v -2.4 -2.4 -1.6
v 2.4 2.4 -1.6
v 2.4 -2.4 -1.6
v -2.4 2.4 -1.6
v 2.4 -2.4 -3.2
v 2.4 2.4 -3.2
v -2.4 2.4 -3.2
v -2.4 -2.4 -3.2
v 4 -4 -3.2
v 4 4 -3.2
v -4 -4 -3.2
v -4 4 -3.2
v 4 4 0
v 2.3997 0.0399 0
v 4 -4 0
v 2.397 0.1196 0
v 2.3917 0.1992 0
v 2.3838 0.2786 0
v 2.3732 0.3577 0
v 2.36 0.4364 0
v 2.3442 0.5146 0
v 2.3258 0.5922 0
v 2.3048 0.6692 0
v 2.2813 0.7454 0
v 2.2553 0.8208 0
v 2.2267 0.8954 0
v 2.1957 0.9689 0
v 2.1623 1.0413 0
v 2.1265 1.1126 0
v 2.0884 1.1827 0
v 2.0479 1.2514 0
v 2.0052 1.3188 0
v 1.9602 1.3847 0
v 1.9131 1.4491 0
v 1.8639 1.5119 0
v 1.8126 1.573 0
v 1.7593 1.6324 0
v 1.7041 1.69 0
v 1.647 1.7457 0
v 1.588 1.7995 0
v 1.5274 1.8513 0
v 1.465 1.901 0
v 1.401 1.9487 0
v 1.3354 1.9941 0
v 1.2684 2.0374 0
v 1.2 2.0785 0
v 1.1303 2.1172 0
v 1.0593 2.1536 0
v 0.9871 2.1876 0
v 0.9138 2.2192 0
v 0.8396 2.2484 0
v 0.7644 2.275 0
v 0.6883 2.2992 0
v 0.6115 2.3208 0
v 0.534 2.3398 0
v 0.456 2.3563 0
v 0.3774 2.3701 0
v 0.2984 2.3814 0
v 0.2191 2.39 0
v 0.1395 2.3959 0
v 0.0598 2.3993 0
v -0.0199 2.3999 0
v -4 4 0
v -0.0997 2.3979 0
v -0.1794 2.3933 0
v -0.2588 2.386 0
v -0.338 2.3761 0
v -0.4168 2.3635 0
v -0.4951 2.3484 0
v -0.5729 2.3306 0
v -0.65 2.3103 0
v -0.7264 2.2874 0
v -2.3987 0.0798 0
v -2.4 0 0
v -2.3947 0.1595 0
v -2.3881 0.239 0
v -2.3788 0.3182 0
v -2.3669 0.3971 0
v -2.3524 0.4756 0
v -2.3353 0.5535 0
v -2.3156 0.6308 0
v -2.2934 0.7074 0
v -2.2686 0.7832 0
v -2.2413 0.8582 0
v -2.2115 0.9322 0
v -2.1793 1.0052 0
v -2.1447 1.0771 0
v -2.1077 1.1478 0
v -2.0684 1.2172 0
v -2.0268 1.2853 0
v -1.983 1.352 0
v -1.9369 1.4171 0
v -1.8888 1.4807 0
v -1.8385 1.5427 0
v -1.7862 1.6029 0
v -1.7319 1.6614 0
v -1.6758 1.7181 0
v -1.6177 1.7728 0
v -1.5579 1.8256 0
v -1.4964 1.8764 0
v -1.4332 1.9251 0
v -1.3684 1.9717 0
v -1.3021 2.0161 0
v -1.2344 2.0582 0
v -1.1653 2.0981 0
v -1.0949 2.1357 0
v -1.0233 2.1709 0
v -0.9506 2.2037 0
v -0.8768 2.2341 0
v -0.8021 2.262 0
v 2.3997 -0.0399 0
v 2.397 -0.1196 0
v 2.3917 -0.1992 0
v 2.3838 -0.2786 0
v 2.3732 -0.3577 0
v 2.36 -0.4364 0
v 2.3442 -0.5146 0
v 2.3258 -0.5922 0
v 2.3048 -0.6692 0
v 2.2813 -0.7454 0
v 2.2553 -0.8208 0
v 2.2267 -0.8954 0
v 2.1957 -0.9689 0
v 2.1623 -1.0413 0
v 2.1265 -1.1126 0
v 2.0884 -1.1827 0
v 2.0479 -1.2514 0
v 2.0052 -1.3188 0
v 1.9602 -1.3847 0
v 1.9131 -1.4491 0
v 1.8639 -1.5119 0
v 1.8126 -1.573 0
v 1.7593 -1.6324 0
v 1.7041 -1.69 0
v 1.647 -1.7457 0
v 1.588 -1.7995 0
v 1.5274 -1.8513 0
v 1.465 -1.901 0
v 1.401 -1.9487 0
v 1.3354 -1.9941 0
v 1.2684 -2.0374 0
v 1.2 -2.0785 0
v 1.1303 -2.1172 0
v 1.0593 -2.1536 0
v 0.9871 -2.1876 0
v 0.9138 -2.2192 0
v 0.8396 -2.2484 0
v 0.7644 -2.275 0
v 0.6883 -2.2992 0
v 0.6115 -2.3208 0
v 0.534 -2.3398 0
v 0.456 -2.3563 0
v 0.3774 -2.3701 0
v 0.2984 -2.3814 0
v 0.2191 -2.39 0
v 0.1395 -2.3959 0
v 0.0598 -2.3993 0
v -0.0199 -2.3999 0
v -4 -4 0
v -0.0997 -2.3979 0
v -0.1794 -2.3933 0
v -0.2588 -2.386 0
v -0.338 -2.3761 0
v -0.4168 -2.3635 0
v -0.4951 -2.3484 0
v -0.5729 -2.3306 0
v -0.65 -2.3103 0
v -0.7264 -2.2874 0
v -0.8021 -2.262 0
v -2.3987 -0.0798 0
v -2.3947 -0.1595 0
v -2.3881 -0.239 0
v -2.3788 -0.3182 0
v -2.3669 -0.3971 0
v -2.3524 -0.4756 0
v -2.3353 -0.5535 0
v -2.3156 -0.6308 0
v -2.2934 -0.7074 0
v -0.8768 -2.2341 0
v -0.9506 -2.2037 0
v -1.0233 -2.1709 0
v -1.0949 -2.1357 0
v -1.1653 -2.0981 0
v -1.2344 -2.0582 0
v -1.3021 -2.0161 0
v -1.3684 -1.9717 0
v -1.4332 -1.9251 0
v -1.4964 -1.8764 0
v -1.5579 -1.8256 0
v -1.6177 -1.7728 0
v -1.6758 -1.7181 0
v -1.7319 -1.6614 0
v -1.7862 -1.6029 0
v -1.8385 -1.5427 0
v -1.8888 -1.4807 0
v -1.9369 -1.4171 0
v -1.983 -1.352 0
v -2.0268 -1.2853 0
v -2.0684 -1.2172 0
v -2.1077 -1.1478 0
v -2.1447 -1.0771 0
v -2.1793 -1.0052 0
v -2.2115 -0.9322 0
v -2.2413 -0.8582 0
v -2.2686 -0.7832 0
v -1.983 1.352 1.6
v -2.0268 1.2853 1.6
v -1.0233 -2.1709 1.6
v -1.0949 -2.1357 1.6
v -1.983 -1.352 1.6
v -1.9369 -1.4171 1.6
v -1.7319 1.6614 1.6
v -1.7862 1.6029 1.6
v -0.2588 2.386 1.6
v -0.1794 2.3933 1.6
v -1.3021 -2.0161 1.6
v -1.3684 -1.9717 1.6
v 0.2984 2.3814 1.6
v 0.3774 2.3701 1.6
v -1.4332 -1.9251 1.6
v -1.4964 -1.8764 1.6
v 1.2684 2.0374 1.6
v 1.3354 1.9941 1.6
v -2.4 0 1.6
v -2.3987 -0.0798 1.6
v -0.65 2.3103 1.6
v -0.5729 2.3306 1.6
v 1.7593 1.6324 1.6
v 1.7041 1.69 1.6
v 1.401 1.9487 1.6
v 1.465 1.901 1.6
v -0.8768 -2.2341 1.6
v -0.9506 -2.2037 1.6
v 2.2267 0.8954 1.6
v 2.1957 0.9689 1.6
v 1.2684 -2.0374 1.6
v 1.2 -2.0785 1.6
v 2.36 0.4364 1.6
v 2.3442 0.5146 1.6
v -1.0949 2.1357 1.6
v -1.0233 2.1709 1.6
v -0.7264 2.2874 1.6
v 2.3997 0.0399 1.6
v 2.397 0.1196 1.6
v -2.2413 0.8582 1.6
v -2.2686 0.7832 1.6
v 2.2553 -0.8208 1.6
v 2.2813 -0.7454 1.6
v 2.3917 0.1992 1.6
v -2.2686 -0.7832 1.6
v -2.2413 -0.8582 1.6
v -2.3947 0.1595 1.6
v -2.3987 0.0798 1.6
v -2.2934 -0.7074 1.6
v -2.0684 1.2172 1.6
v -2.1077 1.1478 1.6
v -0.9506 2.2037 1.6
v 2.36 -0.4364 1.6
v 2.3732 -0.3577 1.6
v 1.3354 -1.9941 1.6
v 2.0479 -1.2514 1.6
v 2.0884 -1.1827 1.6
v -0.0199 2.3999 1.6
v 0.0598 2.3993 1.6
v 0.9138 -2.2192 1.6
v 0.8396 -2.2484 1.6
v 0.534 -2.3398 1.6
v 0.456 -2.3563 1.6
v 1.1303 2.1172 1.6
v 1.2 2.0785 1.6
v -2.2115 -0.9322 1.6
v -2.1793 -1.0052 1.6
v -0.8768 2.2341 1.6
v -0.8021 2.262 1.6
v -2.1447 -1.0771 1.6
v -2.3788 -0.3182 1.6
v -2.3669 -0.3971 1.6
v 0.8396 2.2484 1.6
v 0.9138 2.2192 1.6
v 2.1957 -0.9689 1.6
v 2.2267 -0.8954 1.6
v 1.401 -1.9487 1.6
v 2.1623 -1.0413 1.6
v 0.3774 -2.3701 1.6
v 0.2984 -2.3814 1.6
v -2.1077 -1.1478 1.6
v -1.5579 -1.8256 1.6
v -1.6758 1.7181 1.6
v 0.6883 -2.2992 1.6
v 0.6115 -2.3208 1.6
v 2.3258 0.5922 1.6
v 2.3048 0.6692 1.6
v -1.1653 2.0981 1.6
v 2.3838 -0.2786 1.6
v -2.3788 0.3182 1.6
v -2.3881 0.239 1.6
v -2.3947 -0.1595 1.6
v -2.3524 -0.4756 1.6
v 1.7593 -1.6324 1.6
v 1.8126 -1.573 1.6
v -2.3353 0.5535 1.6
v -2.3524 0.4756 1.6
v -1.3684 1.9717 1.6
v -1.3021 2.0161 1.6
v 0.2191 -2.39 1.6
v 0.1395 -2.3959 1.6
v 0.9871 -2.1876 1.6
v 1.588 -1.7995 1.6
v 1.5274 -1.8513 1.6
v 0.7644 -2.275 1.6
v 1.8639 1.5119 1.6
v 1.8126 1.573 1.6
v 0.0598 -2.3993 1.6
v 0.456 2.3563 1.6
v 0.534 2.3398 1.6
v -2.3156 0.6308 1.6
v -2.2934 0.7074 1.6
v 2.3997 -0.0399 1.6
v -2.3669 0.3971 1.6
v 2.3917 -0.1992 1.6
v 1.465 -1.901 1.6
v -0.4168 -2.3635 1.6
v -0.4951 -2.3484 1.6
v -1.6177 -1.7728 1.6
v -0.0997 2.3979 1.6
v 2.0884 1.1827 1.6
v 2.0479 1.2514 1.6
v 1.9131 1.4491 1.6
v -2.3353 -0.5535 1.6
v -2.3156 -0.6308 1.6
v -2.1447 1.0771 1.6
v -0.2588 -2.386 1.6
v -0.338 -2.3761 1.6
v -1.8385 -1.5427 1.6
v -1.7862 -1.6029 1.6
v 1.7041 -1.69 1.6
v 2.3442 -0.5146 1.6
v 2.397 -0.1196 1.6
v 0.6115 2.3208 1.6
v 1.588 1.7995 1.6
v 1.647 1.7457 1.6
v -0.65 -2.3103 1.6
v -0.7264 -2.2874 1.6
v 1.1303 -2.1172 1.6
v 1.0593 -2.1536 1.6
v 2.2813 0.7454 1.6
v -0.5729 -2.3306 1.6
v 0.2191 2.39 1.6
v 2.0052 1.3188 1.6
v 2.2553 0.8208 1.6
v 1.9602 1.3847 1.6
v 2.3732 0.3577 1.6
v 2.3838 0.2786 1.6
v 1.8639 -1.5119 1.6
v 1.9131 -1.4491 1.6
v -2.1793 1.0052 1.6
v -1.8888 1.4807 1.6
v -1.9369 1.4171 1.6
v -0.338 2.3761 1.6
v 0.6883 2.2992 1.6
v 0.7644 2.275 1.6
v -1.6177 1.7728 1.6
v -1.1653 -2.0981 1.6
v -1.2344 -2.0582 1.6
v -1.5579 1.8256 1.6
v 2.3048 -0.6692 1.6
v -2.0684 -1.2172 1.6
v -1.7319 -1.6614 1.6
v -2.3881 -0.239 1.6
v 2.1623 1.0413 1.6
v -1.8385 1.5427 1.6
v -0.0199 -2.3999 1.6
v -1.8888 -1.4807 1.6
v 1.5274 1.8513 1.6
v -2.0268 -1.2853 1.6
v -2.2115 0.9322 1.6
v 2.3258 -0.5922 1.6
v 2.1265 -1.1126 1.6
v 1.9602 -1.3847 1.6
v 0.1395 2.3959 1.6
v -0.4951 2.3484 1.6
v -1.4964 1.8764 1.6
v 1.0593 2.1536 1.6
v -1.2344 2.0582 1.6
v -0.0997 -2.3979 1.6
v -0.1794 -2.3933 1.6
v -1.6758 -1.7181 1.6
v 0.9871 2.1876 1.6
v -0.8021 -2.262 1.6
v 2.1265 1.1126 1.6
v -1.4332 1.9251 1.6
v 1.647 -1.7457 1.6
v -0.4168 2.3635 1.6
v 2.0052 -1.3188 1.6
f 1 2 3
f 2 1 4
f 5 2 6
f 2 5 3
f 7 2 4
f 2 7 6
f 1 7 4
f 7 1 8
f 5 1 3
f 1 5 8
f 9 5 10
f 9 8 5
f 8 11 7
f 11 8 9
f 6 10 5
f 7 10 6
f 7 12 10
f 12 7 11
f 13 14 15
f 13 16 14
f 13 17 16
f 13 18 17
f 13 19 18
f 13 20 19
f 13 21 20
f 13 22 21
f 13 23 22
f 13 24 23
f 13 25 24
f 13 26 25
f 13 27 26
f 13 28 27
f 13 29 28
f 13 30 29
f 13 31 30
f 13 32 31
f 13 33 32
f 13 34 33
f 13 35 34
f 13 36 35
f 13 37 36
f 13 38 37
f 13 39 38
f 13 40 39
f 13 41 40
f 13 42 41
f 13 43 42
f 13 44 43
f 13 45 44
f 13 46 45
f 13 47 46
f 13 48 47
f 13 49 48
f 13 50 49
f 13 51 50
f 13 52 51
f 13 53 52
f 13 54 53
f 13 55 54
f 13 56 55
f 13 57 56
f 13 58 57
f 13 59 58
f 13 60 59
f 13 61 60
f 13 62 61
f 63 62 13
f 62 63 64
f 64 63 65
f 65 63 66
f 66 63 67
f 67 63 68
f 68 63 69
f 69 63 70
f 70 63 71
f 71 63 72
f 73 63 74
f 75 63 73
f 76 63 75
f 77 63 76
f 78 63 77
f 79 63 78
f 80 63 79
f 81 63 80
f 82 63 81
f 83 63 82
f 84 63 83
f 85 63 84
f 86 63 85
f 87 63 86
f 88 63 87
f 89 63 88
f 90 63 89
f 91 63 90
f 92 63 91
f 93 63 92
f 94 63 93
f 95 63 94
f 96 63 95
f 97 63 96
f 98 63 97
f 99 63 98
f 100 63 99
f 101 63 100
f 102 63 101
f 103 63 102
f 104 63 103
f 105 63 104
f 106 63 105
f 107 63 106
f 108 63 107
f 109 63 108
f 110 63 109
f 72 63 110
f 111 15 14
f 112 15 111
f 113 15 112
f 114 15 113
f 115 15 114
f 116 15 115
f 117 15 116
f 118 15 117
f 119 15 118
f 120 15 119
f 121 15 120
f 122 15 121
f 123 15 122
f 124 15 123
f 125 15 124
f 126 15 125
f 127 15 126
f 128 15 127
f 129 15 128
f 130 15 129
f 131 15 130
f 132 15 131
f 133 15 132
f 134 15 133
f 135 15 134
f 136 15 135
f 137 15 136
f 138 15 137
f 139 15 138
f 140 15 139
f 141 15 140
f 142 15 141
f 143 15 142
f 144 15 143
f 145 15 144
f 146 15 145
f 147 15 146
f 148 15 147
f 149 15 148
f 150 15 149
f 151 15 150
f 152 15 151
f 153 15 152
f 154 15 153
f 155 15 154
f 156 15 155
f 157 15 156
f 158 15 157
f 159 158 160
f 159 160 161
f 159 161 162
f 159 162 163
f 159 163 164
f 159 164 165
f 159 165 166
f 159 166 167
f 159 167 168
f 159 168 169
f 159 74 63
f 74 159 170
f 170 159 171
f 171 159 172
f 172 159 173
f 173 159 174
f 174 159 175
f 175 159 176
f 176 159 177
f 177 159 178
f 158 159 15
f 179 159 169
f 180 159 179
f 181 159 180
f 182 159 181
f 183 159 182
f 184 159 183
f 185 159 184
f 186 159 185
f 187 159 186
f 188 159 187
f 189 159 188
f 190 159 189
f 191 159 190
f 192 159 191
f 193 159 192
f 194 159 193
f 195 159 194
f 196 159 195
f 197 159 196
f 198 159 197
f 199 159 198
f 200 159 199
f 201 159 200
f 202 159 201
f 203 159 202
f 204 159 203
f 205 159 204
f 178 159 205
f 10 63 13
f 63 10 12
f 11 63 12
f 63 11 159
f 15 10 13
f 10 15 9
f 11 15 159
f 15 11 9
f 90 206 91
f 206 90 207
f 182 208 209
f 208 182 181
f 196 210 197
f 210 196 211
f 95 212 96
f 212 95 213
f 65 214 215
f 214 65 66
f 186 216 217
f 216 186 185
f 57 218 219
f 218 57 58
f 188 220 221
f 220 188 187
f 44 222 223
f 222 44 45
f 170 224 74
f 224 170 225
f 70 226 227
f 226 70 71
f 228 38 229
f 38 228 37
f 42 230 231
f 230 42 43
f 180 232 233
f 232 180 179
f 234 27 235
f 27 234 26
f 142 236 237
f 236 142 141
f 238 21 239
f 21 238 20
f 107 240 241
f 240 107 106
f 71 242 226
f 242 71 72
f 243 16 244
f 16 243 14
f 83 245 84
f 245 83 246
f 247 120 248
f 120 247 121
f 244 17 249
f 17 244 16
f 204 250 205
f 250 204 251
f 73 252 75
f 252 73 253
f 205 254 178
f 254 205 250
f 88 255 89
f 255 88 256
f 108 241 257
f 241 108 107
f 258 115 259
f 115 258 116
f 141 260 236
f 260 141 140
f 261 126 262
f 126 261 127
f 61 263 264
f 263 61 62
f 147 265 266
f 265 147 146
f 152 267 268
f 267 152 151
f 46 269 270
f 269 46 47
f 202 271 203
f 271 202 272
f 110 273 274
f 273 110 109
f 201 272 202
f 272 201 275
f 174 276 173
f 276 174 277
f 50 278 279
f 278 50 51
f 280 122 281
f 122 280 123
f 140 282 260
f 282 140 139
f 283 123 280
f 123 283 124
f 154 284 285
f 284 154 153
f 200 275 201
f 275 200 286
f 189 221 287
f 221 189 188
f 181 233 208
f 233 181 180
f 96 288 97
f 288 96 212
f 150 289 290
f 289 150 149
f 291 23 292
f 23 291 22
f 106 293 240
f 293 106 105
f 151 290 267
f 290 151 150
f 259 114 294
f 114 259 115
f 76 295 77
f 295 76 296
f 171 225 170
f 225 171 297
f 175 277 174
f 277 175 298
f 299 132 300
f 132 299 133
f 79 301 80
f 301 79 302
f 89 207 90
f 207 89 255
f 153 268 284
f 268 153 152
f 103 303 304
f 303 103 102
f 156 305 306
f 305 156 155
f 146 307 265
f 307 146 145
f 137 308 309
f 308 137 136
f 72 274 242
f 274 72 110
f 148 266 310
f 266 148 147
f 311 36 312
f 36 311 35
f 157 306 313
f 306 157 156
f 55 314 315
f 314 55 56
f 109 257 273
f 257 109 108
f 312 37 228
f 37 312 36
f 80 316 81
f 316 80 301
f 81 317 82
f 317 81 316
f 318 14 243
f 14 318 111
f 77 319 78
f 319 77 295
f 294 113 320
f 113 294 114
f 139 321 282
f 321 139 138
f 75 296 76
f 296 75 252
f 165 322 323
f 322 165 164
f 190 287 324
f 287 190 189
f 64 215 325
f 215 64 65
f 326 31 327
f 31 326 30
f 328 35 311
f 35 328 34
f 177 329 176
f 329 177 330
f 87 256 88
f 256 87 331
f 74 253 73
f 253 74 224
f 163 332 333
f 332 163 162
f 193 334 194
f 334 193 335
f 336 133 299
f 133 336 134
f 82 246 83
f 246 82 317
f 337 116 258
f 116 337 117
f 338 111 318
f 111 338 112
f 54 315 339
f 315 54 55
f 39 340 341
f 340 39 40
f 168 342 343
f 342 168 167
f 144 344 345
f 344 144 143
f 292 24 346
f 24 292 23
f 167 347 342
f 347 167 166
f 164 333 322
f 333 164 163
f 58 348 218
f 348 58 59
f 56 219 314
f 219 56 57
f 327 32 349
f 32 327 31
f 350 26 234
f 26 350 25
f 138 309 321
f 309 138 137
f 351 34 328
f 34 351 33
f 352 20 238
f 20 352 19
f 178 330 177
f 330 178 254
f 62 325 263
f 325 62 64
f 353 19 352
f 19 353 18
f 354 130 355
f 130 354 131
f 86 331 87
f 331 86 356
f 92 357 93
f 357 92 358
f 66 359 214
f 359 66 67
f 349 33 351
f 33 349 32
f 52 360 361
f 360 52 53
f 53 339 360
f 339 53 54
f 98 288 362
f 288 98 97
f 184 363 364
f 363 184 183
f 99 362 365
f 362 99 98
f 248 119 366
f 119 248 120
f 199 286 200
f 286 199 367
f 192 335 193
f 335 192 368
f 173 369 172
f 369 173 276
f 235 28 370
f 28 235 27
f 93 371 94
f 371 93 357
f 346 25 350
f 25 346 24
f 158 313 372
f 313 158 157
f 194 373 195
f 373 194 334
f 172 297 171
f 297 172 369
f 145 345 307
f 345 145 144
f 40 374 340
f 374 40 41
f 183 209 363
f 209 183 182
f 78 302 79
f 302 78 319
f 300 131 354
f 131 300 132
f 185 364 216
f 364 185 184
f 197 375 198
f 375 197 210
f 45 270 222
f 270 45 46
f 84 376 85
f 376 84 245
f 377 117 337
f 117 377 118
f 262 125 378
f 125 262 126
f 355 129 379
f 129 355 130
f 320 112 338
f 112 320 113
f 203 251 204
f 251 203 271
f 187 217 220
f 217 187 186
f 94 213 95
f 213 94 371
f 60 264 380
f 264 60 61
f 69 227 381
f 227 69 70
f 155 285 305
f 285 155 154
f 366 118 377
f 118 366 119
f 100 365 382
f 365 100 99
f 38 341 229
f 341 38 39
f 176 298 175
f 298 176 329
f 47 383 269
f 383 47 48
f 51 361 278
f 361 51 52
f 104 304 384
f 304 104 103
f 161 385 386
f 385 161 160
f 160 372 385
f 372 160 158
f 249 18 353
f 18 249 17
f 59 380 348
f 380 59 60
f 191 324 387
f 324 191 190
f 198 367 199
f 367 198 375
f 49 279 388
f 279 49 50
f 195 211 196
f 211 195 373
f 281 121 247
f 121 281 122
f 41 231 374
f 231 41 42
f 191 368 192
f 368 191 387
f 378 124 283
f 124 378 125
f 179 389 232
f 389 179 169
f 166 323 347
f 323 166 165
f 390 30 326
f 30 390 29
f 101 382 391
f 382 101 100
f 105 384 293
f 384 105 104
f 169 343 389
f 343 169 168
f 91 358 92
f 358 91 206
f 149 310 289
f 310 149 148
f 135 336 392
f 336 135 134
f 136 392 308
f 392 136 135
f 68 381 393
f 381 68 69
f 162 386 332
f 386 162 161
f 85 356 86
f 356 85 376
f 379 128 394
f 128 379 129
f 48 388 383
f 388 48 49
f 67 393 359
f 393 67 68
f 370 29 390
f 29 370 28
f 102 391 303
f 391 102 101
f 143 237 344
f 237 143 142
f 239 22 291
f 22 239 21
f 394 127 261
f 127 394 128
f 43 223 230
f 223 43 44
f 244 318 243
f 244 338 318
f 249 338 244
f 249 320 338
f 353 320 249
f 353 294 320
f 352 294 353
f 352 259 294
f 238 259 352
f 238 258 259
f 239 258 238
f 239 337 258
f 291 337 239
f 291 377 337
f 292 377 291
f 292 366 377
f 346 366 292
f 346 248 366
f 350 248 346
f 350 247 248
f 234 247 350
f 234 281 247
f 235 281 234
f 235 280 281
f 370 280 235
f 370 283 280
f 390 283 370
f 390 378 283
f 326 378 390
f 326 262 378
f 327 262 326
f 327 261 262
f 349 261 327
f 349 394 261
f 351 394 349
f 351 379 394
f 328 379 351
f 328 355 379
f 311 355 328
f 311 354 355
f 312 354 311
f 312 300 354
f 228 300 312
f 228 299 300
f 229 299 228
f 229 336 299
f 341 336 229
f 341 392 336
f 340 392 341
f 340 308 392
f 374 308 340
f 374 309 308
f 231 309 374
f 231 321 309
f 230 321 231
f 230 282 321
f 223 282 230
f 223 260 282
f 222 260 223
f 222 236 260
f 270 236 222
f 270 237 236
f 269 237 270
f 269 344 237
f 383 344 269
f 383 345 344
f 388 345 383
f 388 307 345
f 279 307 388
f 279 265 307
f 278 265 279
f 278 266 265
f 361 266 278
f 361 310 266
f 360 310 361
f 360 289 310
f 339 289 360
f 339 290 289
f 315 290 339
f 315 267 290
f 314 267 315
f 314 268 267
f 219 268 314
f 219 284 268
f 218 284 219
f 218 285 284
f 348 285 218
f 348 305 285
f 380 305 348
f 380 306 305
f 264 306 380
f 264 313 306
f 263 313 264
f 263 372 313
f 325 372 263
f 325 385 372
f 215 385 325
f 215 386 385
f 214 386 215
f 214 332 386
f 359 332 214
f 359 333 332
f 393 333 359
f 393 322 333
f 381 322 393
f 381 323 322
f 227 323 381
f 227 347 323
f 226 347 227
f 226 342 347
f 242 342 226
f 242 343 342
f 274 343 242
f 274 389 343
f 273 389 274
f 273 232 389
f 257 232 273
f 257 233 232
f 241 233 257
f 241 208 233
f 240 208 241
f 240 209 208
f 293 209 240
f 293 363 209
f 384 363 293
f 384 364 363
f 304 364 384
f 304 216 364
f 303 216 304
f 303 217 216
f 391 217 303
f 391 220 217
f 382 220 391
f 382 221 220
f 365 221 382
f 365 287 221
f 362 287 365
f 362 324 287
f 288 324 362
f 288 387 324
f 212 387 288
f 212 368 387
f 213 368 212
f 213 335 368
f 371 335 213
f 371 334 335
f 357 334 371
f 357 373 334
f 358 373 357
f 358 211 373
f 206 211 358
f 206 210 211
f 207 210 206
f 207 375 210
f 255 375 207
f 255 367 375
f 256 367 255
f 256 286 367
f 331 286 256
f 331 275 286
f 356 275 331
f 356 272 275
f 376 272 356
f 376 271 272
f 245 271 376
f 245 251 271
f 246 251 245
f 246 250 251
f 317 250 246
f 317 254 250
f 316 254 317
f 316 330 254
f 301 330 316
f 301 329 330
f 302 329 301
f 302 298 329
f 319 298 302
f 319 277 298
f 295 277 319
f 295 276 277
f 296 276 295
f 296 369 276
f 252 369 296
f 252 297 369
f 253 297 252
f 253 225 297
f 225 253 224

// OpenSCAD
// file: ../p/4-4edge.scad
use <../lib.scad>
$fa=1; $fs=0.2;
function ldraw_lib__4_4edge(realsolid=false) = [
// 0 Circle 1.0
// 0 Name: 4-4edge.dat
// 0 Author: James Jessiman
// 0 !LDRAW_ORG Primitive UPDATE 2017-01
// 0 !LICENSE Licensed under CC BY 2.0 and CC BY 4.0 : see CAreadme.txt
// 
// 0 BFC CERTIFY CCW
  [0,"BFC","CERTIFY"],
  [0,"BFC","CCW"],
// 
// 0 !HISTORY 1998-12-15 [PTadmin] Official Update 1998-10
// 0 !HISTORY 2005-12-28 [PTadmin] Official Update 2005-01
// 0 !HISTORY 2007-06-24 [PTadmin] Header formatted for Contributor Agreement
// 0 !HISTORY 2008-07-01 [PTadmin] Official Update 2008-01
// 0 !HISTORY 2017-01-15 [Steffen] BFCed
// 0 !HISTORY 2017-12-30 [PTadmin] Official Update 2017-01
// 
// 
// 2 24 1 0 0 0.9239 0 0.3827
  [2,24,1,0,0,0.9239,0,0.3827],
// 2 24 0.9239 0 0.3827 0.7071 0 0.7071
  [2,24,0.9239,0,0.3827,0.7071,0,0.7071],
// 2 24 0.7071 0 0.7071 0.3827 0 0.9239
  [2,24,0.7071,0,0.7071,0.3827,0,0.9239],
// 2 24 0.3827 0 0.9239 0 0 1
  [2,24,0.3827,0,0.9239,0,0,1],
// 2 24 0 0 1 -0.3827 0 0.9239
  [2,24,0,0,1,-0.3827,0,0.9239],
// 2 24 -0.3827 0 0.9239 -0.7071 0 0.7071
  [2,24,-0.3827,0,0.9239,-0.7071,0,0.7071],
// 2 24 -0.7071 0 0.7071 -0.9239 0 0.3827
  [2,24,-0.7071,0,0.7071,-0.9239,0,0.3827],
// 2 24 -0.9239 0 0.3827 -1 0 -0
  [2,24,-0.9239,0,0.3827,-1,0,-0],
// 2 24 -1 0 -0 -0.9239 0 -0.3827
  [2,24,-1,0,-0,-0.9239,0,-0.3827],
// 2 24 -0.9239 0 -0.3827 -0.7071 0 -0.7071
  [2,24,-0.9239,0,-0.3827,-0.7071,0,-0.7071],
// 2 24 -0.7071 0 -0.7071 -0.3827 0 -0.9239
  [2,24,-0.7071,0,-0.7071,-0.3827,0,-0.9239],
// 2 24 -0.3827 0 -0.9239 0 0 -1
  [2,24,-0.3827,0,-0.9239,0,0,-1],
// 2 24 0 0 -1 0.3827 0 -0.9239
  [2,24,0,0,-1,0.3827,0,-0.9239],
// 2 24 0.3827 0 -0.9239 0.7071 0 -0.7071
  [2,24,0.3827,0,-0.9239,0.7071,0,-0.7071],
// 2 24 0.7071 0 -0.7071 0.9239 0 -0.3827
  [2,24,0.7071,0,-0.7071,0.9239,0,-0.3827],
// 2 24 0.9239 0 -0.3827 1 0 0
  [2,24,0.9239,0,-0.3827,1,0,0],
];
module ldraw_lib__4_4edge(step=0, col=false, unit=2/5, alt=false, line=0.2, solid=!$preview)
    makepoly(ldraw_lib__4_4edge(solid), step=step, col=col, unit=unit, alt=alt, line=line, solid=solid);
ldraw_lib__4_4edge(line=0.2);
// file: ../p/4-4disc.scad
use <../lib.scad>
$fa=1; $fs=0.2;
function ldraw_lib__4_4disc(realsolid=false) = [
// 0 Disc 1.0
// 0 Name: 4-4disc.dat
// 0 Author: James Jessiman
// 0 !LDRAW_ORG Primitive UPDATE 2002-02
// 0 !LICENSE Licensed under CC BY 2.0 and CC BY 4.0 : see CAreadme.txt
// 
// 0 BFC CERTIFY CCW
  [0,"BFC","CERTIFY"],
  [0,"BFC","CCW"],
// 
// 0 !HISTORY 1998-12-15 [PTadmin] Official Update 1998-10
// 0 !HISTORY 2002-03-23 [sbliss] Added BFC statement
// 0 !HISTORY 2002-04-25 [PTadmin] Official Update 2002-02
// 0 !HISTORY 2007-06-24 [PTadmin] Header formatted for Contributor Agreement
// 0 !HISTORY 2008-07-01 [PTadmin] Official Update 2008-01
// 
// 
// 3 16 0 0 0 1 0 0 0.9239 0 0.3827
  [3,16,0,0,0,1,0,0,0.9239,0,0.3827],
// 3 16 0 0 0 0.9239 0 0.3827 0.7071 0 0.7071
  [3,16,0,0,0,0.9239,0,0.3827,0.7071,0,0.7071],
// 3 16 0 0 0 0.7071 0 0.7071 0.3827 0 0.9239
  [3,16,0,0,0,0.7071,0,0.7071,0.3827,0,0.9239],
// 3 16 0 0 0 0.3827 0 0.9239 0 0 1
  [3,16,0,0,0,0.3827,0,0.9239,0,0,1],
// 3 16 0 0 0 0 0 1 -0.3827 0 0.9239
  [3,16,0,0,0,0,0,1,-0.3827,0,0.9239],
// 3 16 0 0 0 -0.3827 0 0.9239 -0.7071 0 0.7071
  [3,16,0,0,0,-0.3827,0,0.9239,-0.7071,0,0.7071],
// 3 16 0 0 0 -0.7071 0 0.7071 -0.9239 0 0.3827
  [3,16,0,0,0,-0.7071,0,0.7071,-0.9239,0,0.3827],
// 3 16 0 0 0 -0.9239 0 0.3827 -1 0 -0
  [3,16,0,0,0,-0.9239,0,0.3827,-1,0,-0],
// 3 16 0 0 0 -1 0 -0 -0.9239 0 -0.3827
  [3,16,0,0,0,-1,0,-0,-0.9239,0,-0.3827],
// 3 16 0 0 0 -0.9239 0 -0.3827 -0.7071 0 -0.7071
  [3,16,0,0,0,-0.9239,0,-0.3827,-0.7071,0,-0.7071],
// 3 16 0 0 0 -0.7071 0 -0.7071 -0.3827 0 -0.9239
  [3,16,0,0,0,-0.7071,0,-0.7071,-0.3827,0,-0.9239],
// 3 16 0 0 0 -0.3827 0 -0.9239 0 0 -1
  [3,16,0,0,0,-0.3827,0,-0.9239,0,0,-1],
// 3 16 0 0 0 0 0 -1 0.3827 0 -0.9239
  [3,16,0,0,0,0,0,-1,0.3827,0,-0.9239],
// 3 16 0 0 0 0.3827 0 -0.9239 0.7071 0 -0.7071
  [3,16,0,0,0,0.3827,0,-0.9239,0.7071,0,-0.7071],
// 3 16 0 0 0 0.7071 0 -0.7071 0.9239 0 -0.3827
  [3,16,0,0,0,0.7071,0,-0.7071,0.9239,0,-0.3827],
// 3 16 0 0 0 0.9239 0 -0.3827 1 0 0
  [3,16,0,0,0,0.9239,0,-0.3827,1,0,0],
// 0
];
module ldraw_lib__4_4disc(step=0, col=false, unit=2/5, alt=false, line=0.2, solid=!$preview)
    makepoly(ldraw_lib__4_4disc(solid), step=step, col=col, unit=unit, alt=alt, line=line, solid=solid);
ldraw_lib__4_4disc(line=0.2);
// file: ../p/4-4cyli.scad
use <../lib.scad>
$fa=1; $fs=0.2;
function ldraw_lib__4_4cyli(realsolid=false) = [
// 0 Cylinder 1.0
// 0 Name: 4-4cyli.dat
// 0 Author: James Jessiman
// 0 !LDRAW_ORG Primitive UPDATE 2005-01
// 0 !LICENSE Licensed under CC BY 2.0 and CC BY 4.0 : see CAreadme.txt
// 
// 0 BFC CERTIFY CCW
  [0,"BFC","CERTIFY"],
  [0,"BFC","CCW"],
// 
// 0 !HISTORY 1998-12-15 [PTadmin] Official Update 1998-10
// 0 !HISTORY 2002-03-23 [sbliss] Added BFC statement; merged headers from files in distributions LDraw 0.27 and Complete.
// 0 !HISTORY 2002-04-25 [PTadmin] Official Update 2002-02
// 0 !HISTORY 2004-12-14 [guyvivan] BFC CCW
// 0 !HISTORY 2005-12-28 [PTadmin] Official Update 2005-01
// 0 !HISTORY 2007-06-24 [PTadmin] Header formatted for Contributor Agreement
// 0 !HISTORY 2008-07-01 [PTadmin] Official Update 2008-01
// 
// 
// 4 16 1 1 0 0.9239 1 0.3827 0.9239 0 0.3827 1 0 0
  [4,16,1,1,0,0.9239,1,0.3827,0.9239,0,0.3827,1,0,0],
// 5 24 1 0 0 1 1 0 0.9239 0 0.3827 0.9239 0 -0.3827
  [5,24,1,0,0,1,1,0,0.9239,0,0.3827,0.9239,0,-0.3827],
// 4 16 0.9239 1 0.3827 0.7071 1 0.7071 0.7071 0 0.7071 0.9239 0 0.3827
  [4,16,0.9239,1,0.3827,0.7071,1,0.7071,0.7071,0,0.7071,0.9239,0,0.3827],
// 5 24 0.9239 0 0.3827 0.9239 1 0.3827 0.7071 0 0.7071 1 0 0
  [5,24,0.9239,0,0.3827,0.9239,1,0.3827,0.7071,0,0.7071,1,0,0],
// 4 16 0.7071 1 0.7071 0.3827 1 0.9239 0.3827 0 0.9239 0.7071 0 0.7071
  [4,16,0.7071,1,0.7071,0.3827,1,0.9239,0.3827,0,0.9239,0.7071,0,0.7071],
// 5 24 0.7071 0 0.7071 0.7071 1 0.7071 0.3827 0 0.9239 0.9239 0 0.3827
  [5,24,0.7071,0,0.7071,0.7071,1,0.7071,0.3827,0,0.9239,0.9239,0,0.3827],
// 4 16 0.3827 1 0.9239 0 1 1 0 0 1 0.3827 0 0.9239
  [4,16,0.3827,1,0.9239,0,1,1,0,0,1,0.3827,0,0.9239],
// 5 24 0.3827 0 0.9239 0.3827 1 0.9239 0 0 1 0.7071 0 0.7071
  [5,24,0.3827,0,0.9239,0.3827,1,0.9239,0,0,1,0.7071,0,0.7071],
// 4 16 0 1 1 -0.3827 1 0.9239 -0.3827 0 0.9239 0 0 1
  [4,16,0,1,1,-0.3827,1,0.9239,-0.3827,0,0.9239,0,0,1],
// 5 24 0 0 1 0 1 1 -0.3827 0 0.9239 0.3827 0 0.9239
  [5,24,0,0,1,0,1,1,-0.3827,0,0.9239,0.3827,0,0.9239],
// 4 16 -0.3827 1 0.9239 -0.7071 1 0.7071 -0.7071 0 0.7071 -0.3827 0 0.9239
  [4,16,-0.3827,1,0.9239,-0.7071,1,0.7071,-0.7071,0,0.7071,-0.3827,0,0.9239],
// 5 24 -0.3827 0 0.9239 -0.3827 1 0.9239 -0.7071 0 0.7071 0 0 1
  [5,24,-0.3827,0,0.9239,-0.3827,1,0.9239,-0.7071,0,0.7071,0,0,1],
// 4 16 -0.7071 1 0.7071 -0.9239 1 0.3827 -0.9239 0 0.3827 -0.7071 0 0.7071
  [4,16,-0.7071,1,0.7071,-0.9239,1,0.3827,-0.9239,0,0.3827,-0.7071,0,0.7071],
// 5 24 -0.7071 0 0.7071 -0.7071 1 0.7071 -0.9239 0 0.3827 -0.3827 0 0.9239
  [5,24,-0.7071,0,0.7071,-0.7071,1,0.7071,-0.9239,0,0.3827,-0.3827,0,0.9239],
// 4 16 -0.9239 1 0.3827 -1 1 0 -1 0 0 -0.9239 0 0.3827
  [4,16,-0.9239,1,0.3827,-1,1,0,-1,0,0,-0.9239,0,0.3827],
// 5 24 -0.9239 0 0.3827 -0.9239 1 0.3827 -1 0 0 -0.7071 0 0.7071
  [5,24,-0.9239,0,0.3827,-0.9239,1,0.3827,-1,0,0,-0.7071,0,0.7071],
// 4 16 -1 1 0 -0.9239 1 -0.3827 -0.9239 0 -0.3827 -1 0 0
  [4,16,-1,1,0,-0.9239,1,-0.3827,-0.9239,0,-0.3827,-1,0,0],
// 5 24 -1 0 0 -1 1 0 -0.9239 0 -0.3827 -0.9239 0 0.3827
  [5,24,-1,0,0,-1,1,0,-0.9239,0,-0.3827,-0.9239,0,0.3827],
// 4 16 -0.9239 1 -0.3827 -0.7071 1 -0.7071 -0.7071 0 -0.7071 -0.9239 0 -0.3827
  [4,16,-0.9239,1,-0.3827,-0.7071,1,-0.7071,-0.7071,0,-0.7071,-0.9239,0,-0.3827],
// 5 24 -0.9239 0 -0.3827 -0.9239 1 -0.3827 -0.7071 0 -0.7071 -1 0 0
  [5,24,-0.9239,0,-0.3827,-0.9239,1,-0.3827,-0.7071,0,-0.7071,-1,0,0],
// 4 16 -0.7071 1 -0.7071 -0.3827 1 -0.9239 -0.3827 0 -0.9239 -0.7071 0 -0.7071
  [4,16,-0.7071,1,-0.7071,-0.3827,1,-0.9239,-0.3827,0,-0.9239,-0.7071,0,-0.7071],
// 5 24 -0.7071 0 -0.7071 -0.7071 1 -0.7071 -0.3827 0 -0.9239 -0.9239 0 -0.3827
  [5,24,-0.7071,0,-0.7071,-0.7071,1,-0.7071,-0.3827,0,-0.9239,-0.9239,0,-0.3827],
// 4 16 -0.3827 1 -0.9239 0 1 -1 0 0 -1 -0.3827 0 -0.9239
  [4,16,-0.3827,1,-0.9239,0,1,-1,0,0,-1,-0.3827,0,-0.9239],
// 5 24 -0.3827 0 -0.9239 -0.3827 1 -0.9239 0 0 -1 -0.7071 0 -0.7071
  [5,24,-0.3827,0,-0.9239,-0.3827,1,-0.9239,0,0,-1,-0.7071,0,-0.7071],
// 4 16 0 1 -1 0.3827 1 -0.9239 0.3827 0 -0.9239 0 0 -1
  [4,16,0,1,-1,0.3827,1,-0.9239,0.3827,0,-0.9239,0,0,-1],
// 5 24 0 0 -1 0 1 -1 0.3827 0 -0.9239 -0.3827 0 -0.9239
  [5,24,0,0,-1,0,1,-1,0.3827,0,-0.9239,-0.3827,0,-0.9239],
// 4 16 0.3827 1 -0.9239 0.7071 1 -0.7071 0.7071 0 -0.7071 0.3827 0 -0.9239
  [4,16,0.3827,1,-0.9239,0.7071,1,-0.7071,0.7071,0,-0.7071,0.3827,0,-0.9239],
// 5 24 0.3827 0 -0.9239 0.3827 1 -0.9239 0.7071 0 -0.7071 0 0 -1
  [5,24,0.3827,0,-0.9239,0.3827,1,-0.9239,0.7071,0,-0.7071,0,0,-1],
// 4 16 0.7071 1 -0.7071 0.9239 1 -0.3827 0.9239 0 -0.3827 0.7071 0 -0.7071
  [4,16,0.7071,1,-0.7071,0.9239,1,-0.3827,0.9239,0,-0.3827,0.7071,0,-0.7071],
// 5 24 0.7071 0 -0.7071 0.7071 1 -0.7071 0.9239 0 -0.3827 0.3827 0 -0.9239
  [5,24,0.7071,0,-0.7071,0.7071,1,-0.7071,0.9239,0,-0.3827,0.3827,0,-0.9239],
// 4 16 0.9239 1 -0.3827 1 1 0 1 0 0 0.9239 0 -0.3827
  [4,16,0.9239,1,-0.3827,1,1,0,1,0,0,0.9239,0,-0.3827],
// 5 24 0.9239 0 -0.3827 0.9239 1 -0.3827 1 0 0 0.7071 0 -0.7071
  [5,24,0.9239,0,-0.3827,0.9239,1,-0.3827,1,0,0,0.7071,0,-0.7071],
// 0
];
module ldraw_lib__4_4cyli(step=0, col=false, unit=2/5, alt=false, line=0.2, solid=!$preview)
    makepoly(ldraw_lib__4_4cyli(solid), step=step, col=col, unit=unit, alt=alt, line=line, solid=solid);
ldraw_lib__4_4cyli(line=0.2);
// file: ../p/stud3.scad
use <../lib.scad>
use <4-4cyli.scad>
use <4-4disc.scad>
use <4-4edge.scad>
$fa=1; $fs=0.2;
function ldraw_lib__stud3(realsolid=false) = realsolid ? 
    [openscad(translate([0,0,-eps()], o=cylinder(4+eps(), r=4)),2)] : [
// 0 Stud Tube Solid
// 0 Name: stud3.dat
// 0 Author: James Jessiman
// 0 !LDRAW_ORG Primitive UPDATE 2012-01
// 0 !LICENSE Licensed under CC BY 2.0 and CC BY 4.0 : see CAreadme.txt
// 
// 0 BFC CERTIFY CCW
  [0,"BFC","CERTIFY"],
  [0,"BFC","CCW"],
// 
// 0 !HISTORY 2002-04-04 [sbliss] Modified for BFC compliance
// 0 !HISTORY 2002-04-25 [PTadmin] Official Update 2002-02
// 0 !HISTORY 2007-06-24 [PTadmin] Header formatted for Contributor Agreement
// 0 !HISTORY 2008-07-01 [PTadmin] Official Update 2008-01
// 0 !HISTORY 2012-02-16 [Philo] Changed to CCW
// 0 !HISTORY 2012-03-30 [PTadmin] Official Update 2012-01
// 
// 
// 1 16 0 -4 0 4 0 0 0 1 0 0 0 4 4-4edge.dat
  [1,16,0,-4,0,4,0,0,0,1,0,0,0,4, ldraw_lib__4_4edge(realsolid)],
// 1 16 0 0 0 4 0 0 0 1 0 0 0 4 4-4edge.dat
  [1,16,0,0,0,4,0,0,0,1,0,0,0,4, ldraw_lib__4_4edge(realsolid)],
// 1 16 0 -4 0 4 0 0 0 1 0 0 0 4 4-4disc.dat
  [1,16,0,-4,0,4,0,0,0,1,0,0,0,4, ldraw_lib__4_4disc(realsolid)],
// 1 16 0 -4 0 4 0 0 0 4 0 0 0 4 4-4cyli.dat
  [1,16,0,-4,0,4,0,0,0,4,0,0,0,4, ldraw_lib__4_4cyli(realsolid)],
];
module ldraw_lib__stud3(step=0, col=false, unit=2/5, alt=false, line=0.2, solid=!$preview)
    makepoly(ldraw_lib__stud3(solid), step=step, col=col, unit=unit, alt=alt, line=line, solid=solid);
ldraw_lib__stud3(line=0.2);
// file: ../p/stud.scad
use <../lib.scad>
use <4-4cyli.scad>
use <4-4disc.scad>
use <4-4edge.scad>
$fa=1; $fs=0.2;
function ldraw_lib__stud(realsolid=false) = realsolid ? 
    [openscad(translate([0,0,-eps()], o=cylinder(4+eps(), r=6)),2)] : [
// 0 Stud
// 0 Name: stud.dat
// 0 Author: James Jessiman
// 0 !LDRAW_ORG Primitive UPDATE 2012-01
// 0 !LICENSE Licensed under CC BY 2.0 and CC BY 4.0 : see CAreadme.txt
// 
// 0 BFC CERTIFY CCW
  [0,"BFC","CERTIFY"],
  [0,"BFC","CCW"],
// 
// 0 !HISTORY 2002-04-04 [sbliss] Modified for BFC compliance
// 0 !HISTORY 2002-04-25 [PTadmin] Official Update 2002-02
// 0 !HISTORY 2007-06-24 [PTadmin] Header formatted for Contributor Agreement
// 0 !HISTORY 2008-07-01 [PTadmin] Official Update 2008-01
// 0 !HISTORY 2012-02-16 [Philo] Changed to CCW
// 0 !HISTORY 2012-03-30 [PTadmin] Official Update 2012-01
// 
// 
// 1 16 0 0 0 6 0 0 0 1 0 0 0 6 4-4edge.dat
  [1,16,0,0,0,6,0,0,0,1,0,0,0,6, ldraw_lib__4_4edge(realsolid)],
// 1 16 0 -4 0 6 0 0 0 1 0 0 0 6 4-4edge.dat
  [1,16,0,-4,0,6,0,0,0,1,0,0,0,6, ldraw_lib__4_4edge(realsolid)],
// 1 16 0 0 0 6 0 0 0 -4 0 0 0 6 4-4cyli.dat
  [1,16,0,0,0,6,0,0,0,-4,0,0,0,6, ldraw_lib__4_4cyli(realsolid)],
// 1 16 0 -4 0 6 0 0 0 1 0 0 0 6 4-4disc.dat
  [1,16,0,-4,0,6,0,0,0,1,0,0,0,6, ldraw_lib__4_4disc(realsolid)],
];
module ldraw_lib__stud(step=0, col=false, unit=2/5, alt=false, line=0.2, solid=!$preview)
    makepoly(ldraw_lib__stud(solid), step=step, col=col, unit=unit, alt=alt, line=line, solid=solid);
ldraw_lib__stud(line=0.2);
// file: ../p/box5.scad
use <../lib.scad>
$fa=1; $fs=0.2;
function ldraw_lib__box5(realsolid=false) = [
// 0 Box with 5 Faces and All Edges
// 0 Name: box5.dat
// 0 Author: James Jessiman
// 0 !LDRAW_ORG Primitive UPDATE 2012-01
// 0 !LICENSE Licensed under CC BY 2.0 and CC BY 4.0 : see CAreadme.txt
// 
// 0 BFC CERTIFY CCW
  [0,"BFC","CERTIFY"],
  [0,"BFC","CCW"],
// 
// 0 !HISTORY 2002-04-03 [sbliss] Modified for BFC compliance
// 0 !HISTORY 2002-04-25 [PTadmin] Official Update 2002-02
// 0 !HISTORY 2007-06-24 [PTadmin] Header formatted for Contributor Agreement
// 0 !HISTORY 2008-07-01 [PTadmin] Official Update 2008-01
// 0 !HISTORY 2012-02-16 [Philo] Changed to CCW
// 0 !HISTORY 2012-03-30 [PTadmin] Official Update 2012-01
// 
// 
// 2 24 1 1 1 -1 1 1
  [2,24,1,1,1,-1,1,1],
// 2 24 -1 1 1 -1 1 -1
  [2,24,-1,1,1,-1,1,-1],
// 2 24 -1 1 -1 1 1 -1
  [2,24,-1,1,-1,1,1,-1],
// 2 24 1 1 -1 1 1 1
  [2,24,1,1,-1,1,1,1],
// 2 24 1 0 1 -1 0 1
  [2,24,1,0,1,-1,0,1],
// 2 24 -1 0 1 -1 0 -1
  [2,24,-1,0,1,-1,0,-1],
// 2 24 -1 0 -1 1 0 -1
  [2,24,-1,0,-1,1,0,-1],
// 2 24 1 0 -1 1 0 1
  [2,24,1,0,-1,1,0,1],
// 2 24 1 0 1 1 1 1
  [2,24,1,0,1,1,1,1],
// 2 24 -1 0 1 -1 1 1
  [2,24,-1,0,1,-1,1,1],
// 2 24 1 0 -1 1 1 -1
  [2,24,1,0,-1,1,1,-1],
// 2 24 -1 0 -1 -1 1 -1
  [2,24,-1,0,-1,-1,1,-1],
// 4 16 -1 1 1 1 1 1 1 1 -1 -1 1 -1
  [4,16,-1,1,1,1,1,1,1,1,-1,-1,1,-1],
// 4 16 -1 1 1 -1 0 1 1 0 1 1 1 1
  [4,16,-1,1,1,-1,0,1,1,0,1,1,1,1],
// 4 16 -1 1 -1 -1 0 -1 -1 0 1 -1 1 1
  [4,16,-1,1,-1,-1,0,-1,-1,0,1,-1,1,1],
// 4 16 1 1 -1 1 0 -1 -1 0 -1 -1 1 -1
  [4,16,1,1,-1,1,0,-1,-1,0,-1,-1,1,-1],
// 4 16 1 1 1 1 0 1 1 0 -1 1 1 -1
  [4,16,1,1,1,1,0,1,1,0,-1,1,1,-1],
];
module ldraw_lib__box5(step=0, col=false, unit=2/5, alt=false, line=0.2, solid=!$preview)
    makepoly(ldraw_lib__box5(solid), step=step, col=col, unit=unit, alt=alt, line=line, solid=solid);
ldraw_lib__box5(line=0.2);
// file: ../p/box4t.scad
use <../lib.scad>
$fa=1; $fs=0.2;
function ldraw_lib__box4t(realsolid=false) = [
// 0 Box with 4 Adjacent Faces and All Edges
// 0 Name: box4t.dat
// 0 Author: Tore Eriksson [Tore_Eriksson]
// 0 !LDRAW_ORG Primitive UPDATE 2003-02
// 0 !LICENSE Licensed under CC BY 2.0 and CC BY 4.0 : see CAreadme.txt
// 
// 0 BFC CERTIFY CCW
  [0,"BFC","CERTIFY"],
  [0,"BFC","CCW"],
// 
// 0 !HISTORY 1997-09-29 [PTadmin] Official Update 1997-15
// 0 !HISTORY 2002-08-31 [izanette] Modified with WINDZ for BFC compliance
// 0 !HISTORY 2003-08-01 [PTadmin] Official Update 2003-02
// 0 !HISTORY 2007-06-24 [PTadmin] Header formatted for Contributor Agreement
// 0 !HISTORY 2008-07-01 [PTadmin] Official Update 2008-01
// 
// 
// 2 24 1 1 1 -1 1 1
  [2,24,1,1,1,-1,1,1],
// 2 24 -1 1 1 -1 1 -1
  [2,24,-1,1,1,-1,1,-1],
// 2 24 -1 1 -1 1 1 -1
  [2,24,-1,1,-1,1,1,-1],
// 2 24 1 1 -1 1 1 1
  [2,24,1,1,-1,1,1,1],
// 2 24 1 0 1 -1 0 1
  [2,24,1,0,1,-1,0,1],
// 2 24 -1 0 1 -1 0 -1
  [2,24,-1,0,1,-1,0,-1],
// 2 24 -1 0 -1 1 0 -1
  [2,24,-1,0,-1,1,0,-1],
// 2 24 1 0 -1 1 0 1
  [2,24,1,0,-1,1,0,1],
// 2 24 1 0 1 1 1 1
  [2,24,1,0,1,1,1,1],
// 2 24 -1 0 1 -1 1 1
  [2,24,-1,0,1,-1,1,1],
// 2 24 1 0 -1 1 1 -1
  [2,24,1,0,-1,1,1,-1],
// 2 24 -1 0 -1 -1 1 -1
  [2,24,-1,0,-1,-1,1,-1],
// 4 16 1 1 1 1 1 -1 -1 1 -1 -1 1 1
  [4,16,1,1,1,1,1,-1,-1,1,-1,-1,1,1],
// 4 16 1 1 1 -1 1 1 -1 0 1 1 0 1
  [4,16,1,1,1,-1,1,1,-1,0,1,1,0,1],
// 4 16 -1 1 1 -1 1 -1 -1 0 -1 -1 0 1
  [4,16,-1,1,1,-1,1,-1,-1,0,-1,-1,0,1],
// 0 4 16 -1 1 -1 -1 0 -1 1 0 -1 1 1 -1
// 4 16 1 1 -1 1 1 1 1 0 1 1 0 -1
  [4,16,1,1,-1,1,1,1,1,0,1,1,0,-1],
// 0
];
module ldraw_lib__box4t(step=0, col=false, unit=2/5, alt=false, line=0.2, solid=!$preview)
    makepoly(ldraw_lib__box4t(solid), step=step, col=col, unit=unit, alt=alt, line=line, solid=solid);
ldraw_lib__box4t(line=0.2);
// file: s/3004s01.scad
use <../../lib.scad>
use <../../p/box4t.scad>
use <../../p/box5.scad>
use <../../p/stud.scad>
use <../../p/stud3.scad>
$fa=1; $fs=0.2;
function ldraw_lib__s__3004s01(realsolid=false) = [
// 0 ~Brick  1 x  2 without Front Face
// 0 Name: s\3004s01.dat
// 0 Author: James Jessiman
// 0 !LDRAW_ORG Subpart UPDATE 2003-03
// 0 !LICENSE Licensed under CC BY 2.0 and CC BY 4.0 : see CAreadme.txt
// 
// 0 BFC CERTIFY CCW
  [0,"BFC","CERTIFY"],
  [0,"BFC","CCW"],
// 
// 0 !HISTORY 2003-09-07 [jriley] Subfiling, BFC
// 0 !HISTORY 2003-12-19 [PTadmin] Official Update 2003-03
// 0 !HISTORY 2007-08-29 [PTadmin] Header formatted for Contributor Agreement
// 0 !HISTORY 2008-07-01 [PTadmin] Official Update 2008-01
// 
// 
// 1 16 0 4 0 1 0 0 0 -5 0 0 0 1 stud3.dat
  [1,16,0,4,0,1,0,0,0,-5,0,0,0,1, ldraw_lib__stud3(realsolid)],
// 0 BFC INVERTNEXT
  [0,"BFC","INVERTNEXT"],
// 1 16 0 24 0 16 0 0 0 -20 0 0 0 6 box5.dat
  [1,16,0,24,0,16,0,0,0,-20,0,0,0,6, ldraw_lib__box5(realsolid)],
// 4 16 20 24 10 16 24 6 -16 24 6 -20 24 10
  [4,16,20,24,10,16,24,6,-16,24,6,-20,24,10],
// 4 16 -20 24 10 -16 24 6 -16 24 -6 -20 24 -10
  [4,16,-20,24,10,-16,24,6,-16,24,-6,-20,24,-10],
// 4 16 -20 24 -10 -16 24 -6 16 24 -6 20 24 -10
  [4,16,-20,24,-10,-16,24,-6,16,24,-6,20,24,-10],
// 4 16 20 24 -10 16 24 -6 16 24 6 20 24 10
  [4,16,20,24,-10,16,24,-6,16,24,6,20,24,10],
// 1 16 0 24 0 20 0 0 0 -24 0 0 0 10 box4t.dat
  [1,16,0,24,0,20,0,0,0,-24,0,0,0,10, ldraw_lib__box4t(realsolid)],
// 1 16 10 0 0 1 0 0 0 1 0 0 0 1 stud.dat
  [1,16,10,0,0,1,0,0,0,1,0,0,0,1, ldraw_lib__stud(realsolid)],
// 1 16 -10 0 0 1 0 0 0 1 0 0 0 1 stud.dat
  [1,16,-10,0,0,1,0,0,0,1,0,0,0,1, ldraw_lib__stud(realsolid)],
// 0
];
module ldraw_lib__s__3004s01(step=0, col=false, unit=2/5, alt=false, line=0.2, solid=!$preview)
    makepoly(ldraw_lib__s__3004s01(solid), step=step, col=col, unit=unit, alt=alt, line=line, solid=solid);
ldraw_lib__s__3004s01(line=0.2);
// file: s/3024s01.scad
use <../../lib.scad>
use <../../p/box4t.scad>
use <../../p/box5.scad>
use <../../p/stud.scad>
$fa=1; $fs=0.2;
function ldraw_lib__s__3024s01(realsolid=false) = [
// 0 ~Plate  1 x  1 without Front Face
// 0 Name: s\3024s01.dat
// 0 Author: Tore Eriksson [Tore_Eriksson]
// 0 !LDRAW_ORG Subpart UPDATE 2012-03
// 0 !LICENSE Licensed under CC BY 2.0 and CC BY 4.0 : see CAreadme.txt
// 
// 0 BFC CERTIFY CCW
  [0,"BFC","CERTIFY"],
  [0,"BFC","CCW"],
// 
// 0 !HISTORY 2012-12-28 [PTadmin] Official Update 2012-03
// 
// 
// 0 BFC INVERTNEXT
  [0,"BFC","INVERTNEXT"],
// 1 16 0 8 0 0 0 6 0 -4 0 -6 0 0 box5.dat
  [1,16,0,8,0,0,0,6,0,-4,0,-6,0,0, ldraw_lib__box5(realsolid)],
// 4 16 10 8 -10 6 8 -6 6 8 6 10 8 10
  [4,16,10,8,-10,6,8,-6,6,8,6,10,8,10],
// 4 16 10 8 10 6 8 6 -6 8 6 -10 8 10
  [4,16,10,8,10,6,8,6,-6,8,6,-10,8,10],
// 4 16 -10 8 10 -6 8 6 -6 8 -6 -10 8 -10
  [4,16,-10,8,10,-6,8,6,-6,8,-6,-10,8,-10],
// 4 16 -10 8 -10 -6 8 -6 6 8 -6 10 8 -10
  [4,16,-10,8,-10,-6,8,-6,6,8,-6,10,8,-10],
// 1 16 0 8 0 10 0 0 0 -8 0 0 0 10 box4t.dat
  [1,16,0,8,0,10,0,0,0,-8,0,0,0,10, ldraw_lib__box4t(realsolid)],
// 1 16 0 0 0 0 0 1 0 1 0 -1 0 0 stud.dat
  [1,16,0,0,0,0,0,1,0,1,0,-1,0,0, ldraw_lib__stud(realsolid)],
];
module ldraw_lib__s__3024s01(step=0, col=false, unit=2/5, alt=false, line=0.2, solid=!$preview)
    makepoly(ldraw_lib__s__3024s01(solid), step=step, col=col, unit=unit, alt=alt, line=line, solid=solid);
ldraw_lib__s__3024s01(line=0.2);
// file: 3004.scad
use <../lib.scad>
use <s/3004s01.scad>
$fa=1; $fs=0.2;
function ldraw_lib__3004(realsolid=false) = [
// 0 Brick  1 x  2
// 0 Name: 3004.dat
// 0 Author: James Jessiman
// 0 !LDRAW_ORG Part UPDATE 2022-05
// 0 !LICENSE Licensed under CC BY 2.0 and CC BY 4.0 : see CAreadme.txt
// 
// 0 BFC CERTIFY CCW
  [0,"BFC","CERTIFY"],
  [0,"BFC","CCW"],
// 
// 0 !HISTORY 2001-10-26 [PTadmin] Official Update 2001-01
// 0 !HISTORY 2002-05-07 {unknown} BFC Certification
// 0 !HISTORY 2002-06-11 [PTadmin] Official Update 2002-03
// 0 !HISTORY 2007-05-07 [PTadmin] Header formatted for Contributor Agreement
// 0 !HISTORY 2008-07-01 [PTadmin] Official Update 2008-01
// 0 !HISTORY 2022-08-04 [MagFors] Using subfile
// 0 !HISTORY 2022-09-15 [PTadmin] Official Update 2022-05
// 
// 
// 1 16 0 0 0 1 0 0 0 1 0 0 0 1 s\3004s01.dat
  [1,16,0,0,0,1,0,0,0,1,0,0,0,1, ldraw_lib__s__3004s01(realsolid)],
// 4 16 -20 24 -10 20 24 -10 20 0 -10 -20 0 -10
  [4,16,-20,24,-10,20,24,-10,20,0,-10,-20,0,-10],
];
module ldraw_lib__3004(step=0, col=false, unit=2/5, alt=false, line=0.2, solid=!$preview)
    makepoly(ldraw_lib__3004(solid), step=step, col=col, unit=unit, alt=alt, line=line, solid=solid);
ldraw_lib__3004(line=0.2);
// file: 3024.scad
use <../lib.scad>
use <s/3024s01.scad>
$fa=1; $fs=0.2;
function ldraw_lib__3024(realsolid=false) = [
// 0 Plate  1 x  1
// 0 Name: 3024.dat
// 0 Author: James Jessiman
// 0 !LDRAW_ORG Part UPDATE 2022-05
// 0 !LICENSE Licensed under CC BY 2.0 and CC BY 4.0 : see CAreadme.txt
// 
// 0 BFC CERTIFY CCW
  [0,"BFC","CERTIFY"],
  [0,"BFC","CCW"],
// 
// 0 !HISTORY 2001-10-26 [PTadmin] Official Update 2001-01
// 0 !HISTORY 2002-05-07 {unknown} BFC Certification
// 0 !HISTORY 2002-06-11 [PTadmin] Official Update 2002-03
// 0 !HISTORY 2007-06-07 [PTadmin] Header formatted for Contributor Agreement
// 0 !HISTORY 2008-07-01 [PTadmin] Official Update 2008-01
// 0 !HISTORY 2022-08-04 [MagFors] Using subfile
// 0 !HISTORY 2022-09-15 [PTadmin] Official Update 2022-05
// 
// 
// 1 16 0 0 0 1 0 0 0 1 0 0 0 1 s\3024s01.dat
  [1,16,0,0,0,1,0,0,0,1,0,0,0,1, ldraw_lib__s__3024s01(realsolid)],
// 4 16 -10 8 -10 10 8 -10 10 0 -10 -10 0 -10
  [4,16,-10,8,-10,10,8,-10,10,0,-10,-10,0,-10],
];
module ldraw_lib__3024(step=0, col=false, unit=2/5, alt=false, line=0.2, solid=!$preview)
    makepoly(ldraw_lib__3024(solid), step=step, col=col, unit=unit, alt=alt, line=line, solid=solid);
ldraw_lib__3024(line=0.2);
// main file
use <../lib.scad>
use <3024.scad>
$fa=1; $fs=0.2;
function ldraw_lib__302421(realsolid=false) = [
// 0 ~_Plate  1 x  1 Red (Obsolete)
// 0 Name: 302421.dat
// 0 Author: [PTadmin]
// 0 !LDRAW_ORG Part Physical_Colour UPDATE 2019-02
// 0 !LICENSE Licensed under CC BY 2.0 and CC BY 4.0 : see CAreadme.txt
// 
// 0 BFC CERTIFY CCW
  [0,"BFC","CERTIFY"],
  [0,"BFC","CCW"],
// 
// 0 !HISTORY 2010-12-31 [PTadmin] Official Update 2010-03
// 0 !HISTORY 2019-07-20 [Holly-Wood] Obsoleted per decision not to include physical colour parts
// 0 !HISTORY 2019-09-09 [PTadmin] Official Update 2019-02
// 
// 
// 0 // This file is a "shortcut" with the correct number for the actual
// 0 // colouring of the part (Red).
// 
// 1 4 0 0 0 1 0 0 0 1 0 0 0 1 3024.dat
  [1,4,0,0,0,1,0,0,0,1,0,0,0,1, ldraw_lib__3024(realsolid)],
];
module ldraw_lib__302421(step=0, col=false, unit=2/5, alt=false, line=0.2, solid=!$preview)
    makepoly(ldraw_lib__302421(solid), step=step, col=col, unit=unit, alt=alt, line=line, solid=solid);
ldraw_lib__302421(line=0.2);
